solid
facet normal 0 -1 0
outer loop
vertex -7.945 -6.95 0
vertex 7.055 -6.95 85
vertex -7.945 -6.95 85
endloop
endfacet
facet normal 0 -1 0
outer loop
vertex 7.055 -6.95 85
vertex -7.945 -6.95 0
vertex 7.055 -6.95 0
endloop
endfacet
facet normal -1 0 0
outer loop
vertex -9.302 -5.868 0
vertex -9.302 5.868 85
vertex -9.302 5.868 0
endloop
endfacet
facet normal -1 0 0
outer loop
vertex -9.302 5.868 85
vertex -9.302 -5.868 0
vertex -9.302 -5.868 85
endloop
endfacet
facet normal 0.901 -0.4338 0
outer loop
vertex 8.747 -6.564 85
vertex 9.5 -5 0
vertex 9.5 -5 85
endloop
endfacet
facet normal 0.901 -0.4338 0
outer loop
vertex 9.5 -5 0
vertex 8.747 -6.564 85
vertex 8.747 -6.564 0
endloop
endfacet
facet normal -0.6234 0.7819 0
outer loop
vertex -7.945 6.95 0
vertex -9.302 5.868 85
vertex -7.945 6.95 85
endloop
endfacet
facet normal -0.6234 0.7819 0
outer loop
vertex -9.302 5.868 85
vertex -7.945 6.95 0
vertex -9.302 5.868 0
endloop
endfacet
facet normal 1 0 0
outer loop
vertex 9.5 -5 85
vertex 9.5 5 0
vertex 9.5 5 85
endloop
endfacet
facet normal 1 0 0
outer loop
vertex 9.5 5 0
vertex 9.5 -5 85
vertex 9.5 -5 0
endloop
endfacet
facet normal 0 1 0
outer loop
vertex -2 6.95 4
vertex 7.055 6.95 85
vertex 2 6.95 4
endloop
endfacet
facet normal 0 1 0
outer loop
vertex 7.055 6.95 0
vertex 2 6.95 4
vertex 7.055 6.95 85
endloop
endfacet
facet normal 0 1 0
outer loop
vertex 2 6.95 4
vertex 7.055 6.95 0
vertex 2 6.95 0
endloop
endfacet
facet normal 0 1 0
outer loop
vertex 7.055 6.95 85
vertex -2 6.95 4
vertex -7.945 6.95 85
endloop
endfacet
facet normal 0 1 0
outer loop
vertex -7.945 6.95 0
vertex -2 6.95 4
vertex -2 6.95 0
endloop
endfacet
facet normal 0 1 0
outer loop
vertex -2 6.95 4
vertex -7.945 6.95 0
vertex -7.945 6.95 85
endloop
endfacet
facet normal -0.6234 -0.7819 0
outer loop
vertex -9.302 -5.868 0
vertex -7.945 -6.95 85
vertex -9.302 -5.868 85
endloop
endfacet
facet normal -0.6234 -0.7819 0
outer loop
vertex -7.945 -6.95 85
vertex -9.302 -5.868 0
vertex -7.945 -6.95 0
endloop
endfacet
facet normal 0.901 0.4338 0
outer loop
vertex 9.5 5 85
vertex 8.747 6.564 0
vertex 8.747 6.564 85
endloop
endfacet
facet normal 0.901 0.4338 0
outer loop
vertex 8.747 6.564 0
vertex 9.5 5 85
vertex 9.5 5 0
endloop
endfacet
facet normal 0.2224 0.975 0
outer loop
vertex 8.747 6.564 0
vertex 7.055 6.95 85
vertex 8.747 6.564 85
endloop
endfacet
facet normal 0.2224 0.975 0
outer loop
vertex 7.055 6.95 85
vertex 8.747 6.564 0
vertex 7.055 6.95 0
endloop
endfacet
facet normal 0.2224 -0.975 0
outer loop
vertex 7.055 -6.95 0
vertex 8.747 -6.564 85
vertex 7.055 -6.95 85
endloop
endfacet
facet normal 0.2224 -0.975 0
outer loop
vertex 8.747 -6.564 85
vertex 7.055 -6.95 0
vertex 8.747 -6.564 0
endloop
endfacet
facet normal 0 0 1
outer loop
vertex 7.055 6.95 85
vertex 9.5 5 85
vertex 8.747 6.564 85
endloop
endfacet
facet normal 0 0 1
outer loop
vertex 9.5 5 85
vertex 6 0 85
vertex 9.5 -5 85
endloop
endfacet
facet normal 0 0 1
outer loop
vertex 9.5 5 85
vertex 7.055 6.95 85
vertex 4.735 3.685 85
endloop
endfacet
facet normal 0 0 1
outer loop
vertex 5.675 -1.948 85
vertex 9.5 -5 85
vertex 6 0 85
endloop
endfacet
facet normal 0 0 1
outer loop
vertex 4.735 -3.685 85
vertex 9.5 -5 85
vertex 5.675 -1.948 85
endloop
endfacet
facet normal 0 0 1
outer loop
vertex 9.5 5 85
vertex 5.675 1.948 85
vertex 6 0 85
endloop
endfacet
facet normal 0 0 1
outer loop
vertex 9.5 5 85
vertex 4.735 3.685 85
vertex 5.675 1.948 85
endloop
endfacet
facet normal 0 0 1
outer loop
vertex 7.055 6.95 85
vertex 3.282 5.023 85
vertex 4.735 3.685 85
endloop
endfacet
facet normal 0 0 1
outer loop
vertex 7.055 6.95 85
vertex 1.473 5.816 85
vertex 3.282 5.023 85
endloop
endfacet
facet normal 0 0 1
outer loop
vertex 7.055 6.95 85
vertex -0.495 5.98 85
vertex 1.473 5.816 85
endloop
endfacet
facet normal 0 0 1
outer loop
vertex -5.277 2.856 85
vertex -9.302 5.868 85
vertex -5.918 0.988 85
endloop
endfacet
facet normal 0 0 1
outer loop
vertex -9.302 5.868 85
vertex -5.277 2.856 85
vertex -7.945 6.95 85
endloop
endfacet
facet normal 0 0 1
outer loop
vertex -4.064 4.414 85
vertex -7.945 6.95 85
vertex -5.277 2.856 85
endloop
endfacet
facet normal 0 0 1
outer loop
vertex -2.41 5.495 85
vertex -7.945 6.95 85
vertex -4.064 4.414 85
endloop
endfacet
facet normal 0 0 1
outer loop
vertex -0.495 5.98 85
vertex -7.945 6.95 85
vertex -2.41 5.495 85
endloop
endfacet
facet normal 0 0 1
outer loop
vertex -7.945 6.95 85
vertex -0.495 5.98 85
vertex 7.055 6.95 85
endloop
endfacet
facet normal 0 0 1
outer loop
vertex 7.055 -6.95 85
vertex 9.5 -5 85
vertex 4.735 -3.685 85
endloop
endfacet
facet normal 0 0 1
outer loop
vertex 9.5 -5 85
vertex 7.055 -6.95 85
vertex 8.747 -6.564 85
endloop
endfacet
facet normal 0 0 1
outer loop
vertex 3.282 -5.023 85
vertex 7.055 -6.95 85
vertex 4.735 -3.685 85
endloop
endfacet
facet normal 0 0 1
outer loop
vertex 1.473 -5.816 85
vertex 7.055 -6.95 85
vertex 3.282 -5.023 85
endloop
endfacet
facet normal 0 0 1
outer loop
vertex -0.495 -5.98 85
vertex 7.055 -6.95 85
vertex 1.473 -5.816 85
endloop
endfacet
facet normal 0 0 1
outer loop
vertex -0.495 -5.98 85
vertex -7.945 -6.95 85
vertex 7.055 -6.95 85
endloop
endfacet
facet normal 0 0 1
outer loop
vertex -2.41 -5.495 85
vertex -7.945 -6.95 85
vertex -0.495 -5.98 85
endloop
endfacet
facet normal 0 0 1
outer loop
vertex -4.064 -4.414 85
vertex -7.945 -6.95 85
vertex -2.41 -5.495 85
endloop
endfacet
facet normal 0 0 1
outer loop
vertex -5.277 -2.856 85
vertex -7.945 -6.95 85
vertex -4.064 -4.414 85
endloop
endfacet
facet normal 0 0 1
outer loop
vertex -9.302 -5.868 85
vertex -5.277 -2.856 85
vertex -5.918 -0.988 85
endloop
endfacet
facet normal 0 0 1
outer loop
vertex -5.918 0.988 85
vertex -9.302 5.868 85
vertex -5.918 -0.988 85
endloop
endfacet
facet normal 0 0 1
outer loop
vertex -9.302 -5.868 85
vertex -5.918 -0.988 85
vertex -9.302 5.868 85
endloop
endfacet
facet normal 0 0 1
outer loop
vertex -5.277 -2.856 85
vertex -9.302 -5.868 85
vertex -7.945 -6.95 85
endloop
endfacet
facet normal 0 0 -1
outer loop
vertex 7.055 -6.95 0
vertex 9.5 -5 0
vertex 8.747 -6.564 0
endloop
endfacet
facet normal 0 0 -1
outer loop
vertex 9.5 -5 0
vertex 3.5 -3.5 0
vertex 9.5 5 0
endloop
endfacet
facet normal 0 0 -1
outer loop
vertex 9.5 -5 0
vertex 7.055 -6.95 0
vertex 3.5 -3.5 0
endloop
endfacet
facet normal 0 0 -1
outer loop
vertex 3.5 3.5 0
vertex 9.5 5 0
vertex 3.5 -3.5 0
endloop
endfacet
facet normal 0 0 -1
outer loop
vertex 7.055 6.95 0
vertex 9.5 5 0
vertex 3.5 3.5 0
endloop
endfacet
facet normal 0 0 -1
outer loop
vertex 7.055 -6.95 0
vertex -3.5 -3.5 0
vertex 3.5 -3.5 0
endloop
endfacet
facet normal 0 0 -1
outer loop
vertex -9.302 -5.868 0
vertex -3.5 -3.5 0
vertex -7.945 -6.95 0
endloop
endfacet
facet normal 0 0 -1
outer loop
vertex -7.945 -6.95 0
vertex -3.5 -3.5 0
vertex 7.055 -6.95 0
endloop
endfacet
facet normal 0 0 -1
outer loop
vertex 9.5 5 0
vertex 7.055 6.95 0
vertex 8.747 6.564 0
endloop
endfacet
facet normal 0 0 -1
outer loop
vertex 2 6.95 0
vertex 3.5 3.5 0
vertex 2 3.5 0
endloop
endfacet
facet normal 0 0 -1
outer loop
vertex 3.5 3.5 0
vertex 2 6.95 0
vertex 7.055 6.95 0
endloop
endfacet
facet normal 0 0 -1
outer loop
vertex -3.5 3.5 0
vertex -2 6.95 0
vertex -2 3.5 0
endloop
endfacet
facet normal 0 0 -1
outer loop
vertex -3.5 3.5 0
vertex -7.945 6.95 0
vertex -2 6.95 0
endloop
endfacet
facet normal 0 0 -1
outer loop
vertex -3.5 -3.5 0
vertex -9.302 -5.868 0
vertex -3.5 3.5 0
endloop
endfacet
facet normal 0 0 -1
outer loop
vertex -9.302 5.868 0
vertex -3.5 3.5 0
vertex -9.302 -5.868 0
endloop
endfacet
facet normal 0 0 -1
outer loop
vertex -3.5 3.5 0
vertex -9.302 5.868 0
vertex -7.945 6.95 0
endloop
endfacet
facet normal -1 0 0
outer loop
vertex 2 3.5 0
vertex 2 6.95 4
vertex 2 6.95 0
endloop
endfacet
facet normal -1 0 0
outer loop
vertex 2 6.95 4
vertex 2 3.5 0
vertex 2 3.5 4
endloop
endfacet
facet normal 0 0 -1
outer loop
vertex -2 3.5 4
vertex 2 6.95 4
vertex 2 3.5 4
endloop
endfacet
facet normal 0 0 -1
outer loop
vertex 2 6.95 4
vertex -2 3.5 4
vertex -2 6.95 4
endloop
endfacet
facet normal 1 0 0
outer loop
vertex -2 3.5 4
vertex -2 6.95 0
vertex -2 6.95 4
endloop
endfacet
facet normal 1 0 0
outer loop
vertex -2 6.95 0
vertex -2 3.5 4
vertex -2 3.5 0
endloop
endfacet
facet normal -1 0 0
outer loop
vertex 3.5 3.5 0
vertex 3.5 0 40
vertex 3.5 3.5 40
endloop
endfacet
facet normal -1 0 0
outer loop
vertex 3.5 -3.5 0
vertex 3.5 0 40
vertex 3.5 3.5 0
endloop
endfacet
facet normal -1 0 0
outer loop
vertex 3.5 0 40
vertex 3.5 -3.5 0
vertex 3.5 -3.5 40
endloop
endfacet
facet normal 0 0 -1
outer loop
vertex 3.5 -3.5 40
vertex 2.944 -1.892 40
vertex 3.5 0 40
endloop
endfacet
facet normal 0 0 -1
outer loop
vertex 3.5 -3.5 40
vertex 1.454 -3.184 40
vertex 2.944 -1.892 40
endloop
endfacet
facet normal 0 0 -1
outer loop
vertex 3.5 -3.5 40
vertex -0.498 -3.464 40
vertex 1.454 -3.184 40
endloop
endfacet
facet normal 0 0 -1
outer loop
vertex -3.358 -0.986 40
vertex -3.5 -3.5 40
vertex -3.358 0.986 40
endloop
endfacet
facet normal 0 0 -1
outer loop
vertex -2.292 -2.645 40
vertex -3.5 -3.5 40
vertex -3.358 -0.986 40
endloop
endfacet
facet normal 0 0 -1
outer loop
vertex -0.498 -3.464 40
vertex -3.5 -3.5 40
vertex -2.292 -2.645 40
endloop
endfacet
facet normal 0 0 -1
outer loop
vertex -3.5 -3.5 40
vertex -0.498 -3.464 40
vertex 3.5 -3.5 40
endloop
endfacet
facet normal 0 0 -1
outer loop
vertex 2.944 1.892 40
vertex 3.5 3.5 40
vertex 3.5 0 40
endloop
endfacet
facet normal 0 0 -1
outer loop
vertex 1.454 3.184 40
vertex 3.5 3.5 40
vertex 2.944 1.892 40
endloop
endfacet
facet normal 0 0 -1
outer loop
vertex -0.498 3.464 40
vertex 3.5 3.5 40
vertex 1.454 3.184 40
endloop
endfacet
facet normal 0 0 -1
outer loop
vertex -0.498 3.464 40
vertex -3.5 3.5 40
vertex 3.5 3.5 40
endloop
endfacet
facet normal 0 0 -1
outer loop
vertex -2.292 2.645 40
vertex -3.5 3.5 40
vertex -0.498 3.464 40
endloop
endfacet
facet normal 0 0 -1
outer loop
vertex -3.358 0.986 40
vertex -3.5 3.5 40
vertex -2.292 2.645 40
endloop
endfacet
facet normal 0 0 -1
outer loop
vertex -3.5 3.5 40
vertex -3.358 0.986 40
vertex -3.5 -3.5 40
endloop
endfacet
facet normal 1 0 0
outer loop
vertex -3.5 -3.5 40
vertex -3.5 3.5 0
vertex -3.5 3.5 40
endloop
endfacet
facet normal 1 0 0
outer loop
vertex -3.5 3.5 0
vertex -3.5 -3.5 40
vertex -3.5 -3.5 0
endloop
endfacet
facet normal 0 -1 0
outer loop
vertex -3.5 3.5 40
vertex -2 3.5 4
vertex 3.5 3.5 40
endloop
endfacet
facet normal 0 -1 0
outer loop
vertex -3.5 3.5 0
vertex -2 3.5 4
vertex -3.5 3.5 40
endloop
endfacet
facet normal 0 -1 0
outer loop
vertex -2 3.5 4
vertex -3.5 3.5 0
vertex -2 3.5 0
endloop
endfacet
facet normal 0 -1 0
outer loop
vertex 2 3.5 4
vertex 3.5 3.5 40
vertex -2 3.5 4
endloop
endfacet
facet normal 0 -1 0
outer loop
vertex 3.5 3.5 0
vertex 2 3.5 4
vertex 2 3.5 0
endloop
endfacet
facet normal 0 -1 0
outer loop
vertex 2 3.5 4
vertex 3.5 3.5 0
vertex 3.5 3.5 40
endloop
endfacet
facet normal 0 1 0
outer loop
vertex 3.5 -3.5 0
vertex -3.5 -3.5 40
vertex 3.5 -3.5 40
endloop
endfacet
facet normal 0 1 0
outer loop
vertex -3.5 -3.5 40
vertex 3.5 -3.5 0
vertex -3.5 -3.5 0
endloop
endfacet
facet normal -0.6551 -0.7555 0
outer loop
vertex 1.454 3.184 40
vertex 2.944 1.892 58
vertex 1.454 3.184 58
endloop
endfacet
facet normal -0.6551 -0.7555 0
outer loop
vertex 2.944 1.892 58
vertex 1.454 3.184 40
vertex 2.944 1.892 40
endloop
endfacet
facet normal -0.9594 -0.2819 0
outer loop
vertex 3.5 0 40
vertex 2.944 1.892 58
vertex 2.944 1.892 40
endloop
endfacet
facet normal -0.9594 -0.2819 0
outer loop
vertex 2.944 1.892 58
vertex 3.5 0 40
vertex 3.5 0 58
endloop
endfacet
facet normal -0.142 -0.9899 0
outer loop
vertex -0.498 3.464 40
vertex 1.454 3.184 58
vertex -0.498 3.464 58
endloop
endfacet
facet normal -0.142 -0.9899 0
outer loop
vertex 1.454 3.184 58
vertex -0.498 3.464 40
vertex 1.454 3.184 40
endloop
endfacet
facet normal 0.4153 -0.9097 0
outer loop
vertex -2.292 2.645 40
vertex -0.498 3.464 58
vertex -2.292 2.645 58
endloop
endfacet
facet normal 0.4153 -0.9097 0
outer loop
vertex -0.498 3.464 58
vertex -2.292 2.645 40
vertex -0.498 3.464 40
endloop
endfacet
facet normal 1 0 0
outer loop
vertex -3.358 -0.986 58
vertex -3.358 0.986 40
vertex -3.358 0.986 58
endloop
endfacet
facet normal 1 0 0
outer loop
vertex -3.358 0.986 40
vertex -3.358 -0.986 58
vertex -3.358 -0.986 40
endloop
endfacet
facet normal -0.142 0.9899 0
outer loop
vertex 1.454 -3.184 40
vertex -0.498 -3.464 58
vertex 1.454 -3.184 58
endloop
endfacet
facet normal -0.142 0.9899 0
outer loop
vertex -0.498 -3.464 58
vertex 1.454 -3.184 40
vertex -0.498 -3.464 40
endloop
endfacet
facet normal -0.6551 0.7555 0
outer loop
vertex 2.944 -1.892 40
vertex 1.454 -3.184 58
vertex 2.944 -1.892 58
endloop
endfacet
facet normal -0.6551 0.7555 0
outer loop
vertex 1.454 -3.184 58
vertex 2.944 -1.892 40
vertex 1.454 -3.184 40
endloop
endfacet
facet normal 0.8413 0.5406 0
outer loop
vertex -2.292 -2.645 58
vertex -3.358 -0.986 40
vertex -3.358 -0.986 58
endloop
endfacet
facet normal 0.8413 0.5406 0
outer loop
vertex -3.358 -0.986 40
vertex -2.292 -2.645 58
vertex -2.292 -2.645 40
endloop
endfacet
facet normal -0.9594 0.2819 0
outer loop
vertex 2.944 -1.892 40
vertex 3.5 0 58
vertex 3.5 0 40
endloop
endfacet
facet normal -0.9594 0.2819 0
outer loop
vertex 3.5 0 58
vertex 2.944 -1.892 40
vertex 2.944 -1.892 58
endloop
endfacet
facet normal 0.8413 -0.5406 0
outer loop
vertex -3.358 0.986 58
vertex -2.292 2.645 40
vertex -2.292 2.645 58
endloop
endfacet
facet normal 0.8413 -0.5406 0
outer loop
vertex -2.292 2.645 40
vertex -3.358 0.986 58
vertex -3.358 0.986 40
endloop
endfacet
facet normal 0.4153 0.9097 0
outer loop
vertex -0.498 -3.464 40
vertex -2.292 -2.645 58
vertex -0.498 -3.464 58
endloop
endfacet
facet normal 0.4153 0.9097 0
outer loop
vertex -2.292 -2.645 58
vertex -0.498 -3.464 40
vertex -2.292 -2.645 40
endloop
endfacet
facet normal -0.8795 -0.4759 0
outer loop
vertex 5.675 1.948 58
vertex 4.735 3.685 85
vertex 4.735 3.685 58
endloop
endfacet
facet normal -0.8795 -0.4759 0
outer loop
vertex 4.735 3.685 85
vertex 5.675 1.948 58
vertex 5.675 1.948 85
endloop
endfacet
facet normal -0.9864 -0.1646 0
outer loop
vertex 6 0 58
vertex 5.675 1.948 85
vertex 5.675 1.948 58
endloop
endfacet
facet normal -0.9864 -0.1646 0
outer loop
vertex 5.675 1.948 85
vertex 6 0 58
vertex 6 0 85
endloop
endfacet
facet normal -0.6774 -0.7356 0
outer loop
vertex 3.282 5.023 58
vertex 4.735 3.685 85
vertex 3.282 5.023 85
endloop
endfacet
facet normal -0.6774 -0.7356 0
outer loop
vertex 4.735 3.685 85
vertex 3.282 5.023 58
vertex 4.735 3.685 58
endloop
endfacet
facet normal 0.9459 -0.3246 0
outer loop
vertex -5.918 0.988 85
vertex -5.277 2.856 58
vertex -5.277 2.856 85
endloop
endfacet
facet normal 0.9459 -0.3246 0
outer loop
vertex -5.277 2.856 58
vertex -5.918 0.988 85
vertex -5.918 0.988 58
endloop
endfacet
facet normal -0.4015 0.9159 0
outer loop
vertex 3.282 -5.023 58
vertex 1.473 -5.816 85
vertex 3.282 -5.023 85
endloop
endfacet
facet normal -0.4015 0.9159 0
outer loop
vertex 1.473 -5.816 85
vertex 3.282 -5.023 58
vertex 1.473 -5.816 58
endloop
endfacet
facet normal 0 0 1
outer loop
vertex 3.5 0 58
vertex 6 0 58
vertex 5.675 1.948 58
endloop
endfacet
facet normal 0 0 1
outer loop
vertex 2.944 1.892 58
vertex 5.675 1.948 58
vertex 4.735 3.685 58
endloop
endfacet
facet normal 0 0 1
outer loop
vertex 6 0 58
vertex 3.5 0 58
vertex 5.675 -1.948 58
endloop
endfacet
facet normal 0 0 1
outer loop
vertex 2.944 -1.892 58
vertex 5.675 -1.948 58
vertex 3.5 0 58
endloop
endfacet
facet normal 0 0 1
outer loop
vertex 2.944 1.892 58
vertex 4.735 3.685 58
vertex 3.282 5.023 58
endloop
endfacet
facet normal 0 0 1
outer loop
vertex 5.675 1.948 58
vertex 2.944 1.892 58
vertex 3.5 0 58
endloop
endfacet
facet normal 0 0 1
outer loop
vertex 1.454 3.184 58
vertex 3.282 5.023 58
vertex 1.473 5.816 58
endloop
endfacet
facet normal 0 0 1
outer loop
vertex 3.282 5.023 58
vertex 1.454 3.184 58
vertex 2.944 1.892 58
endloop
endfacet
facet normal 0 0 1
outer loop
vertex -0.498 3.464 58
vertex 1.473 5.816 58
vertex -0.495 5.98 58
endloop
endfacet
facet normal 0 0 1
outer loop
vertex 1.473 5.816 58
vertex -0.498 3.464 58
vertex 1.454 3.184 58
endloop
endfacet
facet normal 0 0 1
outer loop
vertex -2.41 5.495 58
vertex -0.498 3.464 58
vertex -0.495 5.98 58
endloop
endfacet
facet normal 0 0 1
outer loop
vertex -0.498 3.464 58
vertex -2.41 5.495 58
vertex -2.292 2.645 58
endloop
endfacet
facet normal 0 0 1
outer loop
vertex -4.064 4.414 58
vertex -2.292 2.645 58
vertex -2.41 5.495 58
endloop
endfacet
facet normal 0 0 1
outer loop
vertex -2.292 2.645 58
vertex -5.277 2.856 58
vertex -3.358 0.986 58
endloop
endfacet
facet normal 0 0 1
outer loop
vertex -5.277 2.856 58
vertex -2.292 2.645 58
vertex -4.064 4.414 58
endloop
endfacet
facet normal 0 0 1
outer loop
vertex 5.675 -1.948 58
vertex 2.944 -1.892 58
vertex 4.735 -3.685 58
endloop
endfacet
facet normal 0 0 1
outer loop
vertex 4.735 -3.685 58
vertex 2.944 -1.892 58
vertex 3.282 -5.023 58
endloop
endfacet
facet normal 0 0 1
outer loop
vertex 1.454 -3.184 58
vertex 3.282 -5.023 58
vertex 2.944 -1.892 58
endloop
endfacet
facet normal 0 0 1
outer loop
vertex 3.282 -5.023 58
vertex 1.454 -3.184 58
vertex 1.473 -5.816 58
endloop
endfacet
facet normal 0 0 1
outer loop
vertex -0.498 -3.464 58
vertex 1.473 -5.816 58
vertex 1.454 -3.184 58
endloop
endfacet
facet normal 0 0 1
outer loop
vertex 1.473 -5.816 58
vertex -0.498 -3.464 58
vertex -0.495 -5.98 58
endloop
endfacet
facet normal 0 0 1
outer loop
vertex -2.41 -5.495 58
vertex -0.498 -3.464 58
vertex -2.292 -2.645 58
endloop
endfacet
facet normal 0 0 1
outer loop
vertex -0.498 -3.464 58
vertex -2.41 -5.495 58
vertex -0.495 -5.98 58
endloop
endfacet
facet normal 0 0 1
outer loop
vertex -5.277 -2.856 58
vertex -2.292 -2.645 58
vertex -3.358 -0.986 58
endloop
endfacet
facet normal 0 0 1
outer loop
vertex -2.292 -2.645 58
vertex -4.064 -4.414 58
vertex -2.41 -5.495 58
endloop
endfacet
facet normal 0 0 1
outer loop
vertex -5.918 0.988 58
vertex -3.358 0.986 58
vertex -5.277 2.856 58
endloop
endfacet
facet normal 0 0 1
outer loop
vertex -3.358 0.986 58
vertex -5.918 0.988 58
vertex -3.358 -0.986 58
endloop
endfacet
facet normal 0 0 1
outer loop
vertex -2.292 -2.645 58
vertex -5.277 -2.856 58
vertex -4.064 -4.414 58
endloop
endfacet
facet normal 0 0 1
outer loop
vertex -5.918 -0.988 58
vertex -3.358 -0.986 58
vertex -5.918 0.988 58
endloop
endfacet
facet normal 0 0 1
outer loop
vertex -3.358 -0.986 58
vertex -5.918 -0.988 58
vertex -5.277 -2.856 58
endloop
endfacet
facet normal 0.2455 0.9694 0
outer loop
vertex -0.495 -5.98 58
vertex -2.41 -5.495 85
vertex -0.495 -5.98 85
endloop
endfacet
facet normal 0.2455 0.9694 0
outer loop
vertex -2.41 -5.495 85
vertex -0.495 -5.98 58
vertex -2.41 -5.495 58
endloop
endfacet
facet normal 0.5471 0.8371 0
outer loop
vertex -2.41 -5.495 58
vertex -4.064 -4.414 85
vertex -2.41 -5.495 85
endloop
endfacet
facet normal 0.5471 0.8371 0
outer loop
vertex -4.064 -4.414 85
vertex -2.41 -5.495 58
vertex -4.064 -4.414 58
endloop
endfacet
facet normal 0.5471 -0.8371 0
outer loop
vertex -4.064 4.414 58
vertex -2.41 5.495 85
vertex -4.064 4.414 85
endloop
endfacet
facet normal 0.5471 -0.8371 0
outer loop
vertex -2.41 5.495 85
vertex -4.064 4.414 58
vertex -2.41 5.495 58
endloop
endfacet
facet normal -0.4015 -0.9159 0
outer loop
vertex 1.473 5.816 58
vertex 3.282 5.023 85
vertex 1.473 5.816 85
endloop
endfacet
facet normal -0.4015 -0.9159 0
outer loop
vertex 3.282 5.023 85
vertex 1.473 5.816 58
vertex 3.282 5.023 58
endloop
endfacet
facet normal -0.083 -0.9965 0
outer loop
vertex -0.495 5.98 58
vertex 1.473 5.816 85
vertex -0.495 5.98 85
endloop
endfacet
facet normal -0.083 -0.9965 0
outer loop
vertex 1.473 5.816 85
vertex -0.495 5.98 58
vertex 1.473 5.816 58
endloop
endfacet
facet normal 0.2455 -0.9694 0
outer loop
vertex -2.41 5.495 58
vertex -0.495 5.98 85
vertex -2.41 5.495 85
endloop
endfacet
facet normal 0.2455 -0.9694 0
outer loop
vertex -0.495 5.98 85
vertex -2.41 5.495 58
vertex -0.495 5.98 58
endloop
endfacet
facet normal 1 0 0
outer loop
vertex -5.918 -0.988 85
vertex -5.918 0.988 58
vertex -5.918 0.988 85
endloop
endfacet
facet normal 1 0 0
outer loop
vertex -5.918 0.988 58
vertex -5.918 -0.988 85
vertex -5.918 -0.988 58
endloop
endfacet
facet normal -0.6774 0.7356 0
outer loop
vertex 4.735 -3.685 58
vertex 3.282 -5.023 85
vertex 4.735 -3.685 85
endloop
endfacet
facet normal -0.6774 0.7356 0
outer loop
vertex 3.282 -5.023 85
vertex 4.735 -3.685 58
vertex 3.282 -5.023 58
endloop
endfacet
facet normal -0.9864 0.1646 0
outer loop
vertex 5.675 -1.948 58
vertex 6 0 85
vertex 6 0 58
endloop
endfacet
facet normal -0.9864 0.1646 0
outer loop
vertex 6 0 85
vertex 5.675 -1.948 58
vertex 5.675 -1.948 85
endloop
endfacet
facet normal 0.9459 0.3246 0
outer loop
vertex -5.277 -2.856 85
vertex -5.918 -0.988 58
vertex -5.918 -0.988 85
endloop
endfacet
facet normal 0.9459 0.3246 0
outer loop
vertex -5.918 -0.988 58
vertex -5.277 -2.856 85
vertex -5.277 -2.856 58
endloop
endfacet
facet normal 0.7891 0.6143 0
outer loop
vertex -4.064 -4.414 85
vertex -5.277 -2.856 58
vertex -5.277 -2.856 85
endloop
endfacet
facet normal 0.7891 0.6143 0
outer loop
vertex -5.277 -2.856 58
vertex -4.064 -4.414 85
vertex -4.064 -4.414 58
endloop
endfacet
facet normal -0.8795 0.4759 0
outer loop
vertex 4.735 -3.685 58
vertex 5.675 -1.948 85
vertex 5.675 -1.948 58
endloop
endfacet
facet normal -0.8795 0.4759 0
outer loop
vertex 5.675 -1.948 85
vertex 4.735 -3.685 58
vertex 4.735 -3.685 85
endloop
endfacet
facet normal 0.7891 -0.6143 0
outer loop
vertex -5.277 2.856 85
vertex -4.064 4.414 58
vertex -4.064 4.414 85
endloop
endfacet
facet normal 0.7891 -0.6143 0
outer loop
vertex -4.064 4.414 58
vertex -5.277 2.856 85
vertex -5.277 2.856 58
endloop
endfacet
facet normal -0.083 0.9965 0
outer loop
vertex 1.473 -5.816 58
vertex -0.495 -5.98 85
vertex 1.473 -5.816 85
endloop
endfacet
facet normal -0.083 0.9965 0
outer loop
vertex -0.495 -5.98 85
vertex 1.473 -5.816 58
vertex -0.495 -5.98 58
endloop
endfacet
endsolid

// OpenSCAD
/* module rounded_cylinder(x, y, h, r) { */
/*      minkowski() { */
/*           cube([x-r*2,y-r*2,h]); */
/*           cylinder(r=r, h=1); */
/*      } */
/* } */

module rounded_cylinder(x, y, h, r) {
     linear_extrude(height=h) {
          translate([-(x-r)/2, -(y-r)/2]) {
               minkowski() {
                    square([x-r,y-r]);
                    circle(r);
               }
          }
     }
}


difference() {
     rounded_cylinder(17, 12, 85, 2);
// wire notch
     translate([-2,3])
          cube([4,4,4]);
     
// square part 40
     translate([-3.5, -3.5])
          cube(size=[7,7,40], center=false);
     
// small cylinder part 18
     translate([0,0,40])
          cylinder(r=3.5, h=42, center=false);

// large cylinder part: rest of handle
     translate([0,0,58])
          cylinder(r=6, h=30);
}
